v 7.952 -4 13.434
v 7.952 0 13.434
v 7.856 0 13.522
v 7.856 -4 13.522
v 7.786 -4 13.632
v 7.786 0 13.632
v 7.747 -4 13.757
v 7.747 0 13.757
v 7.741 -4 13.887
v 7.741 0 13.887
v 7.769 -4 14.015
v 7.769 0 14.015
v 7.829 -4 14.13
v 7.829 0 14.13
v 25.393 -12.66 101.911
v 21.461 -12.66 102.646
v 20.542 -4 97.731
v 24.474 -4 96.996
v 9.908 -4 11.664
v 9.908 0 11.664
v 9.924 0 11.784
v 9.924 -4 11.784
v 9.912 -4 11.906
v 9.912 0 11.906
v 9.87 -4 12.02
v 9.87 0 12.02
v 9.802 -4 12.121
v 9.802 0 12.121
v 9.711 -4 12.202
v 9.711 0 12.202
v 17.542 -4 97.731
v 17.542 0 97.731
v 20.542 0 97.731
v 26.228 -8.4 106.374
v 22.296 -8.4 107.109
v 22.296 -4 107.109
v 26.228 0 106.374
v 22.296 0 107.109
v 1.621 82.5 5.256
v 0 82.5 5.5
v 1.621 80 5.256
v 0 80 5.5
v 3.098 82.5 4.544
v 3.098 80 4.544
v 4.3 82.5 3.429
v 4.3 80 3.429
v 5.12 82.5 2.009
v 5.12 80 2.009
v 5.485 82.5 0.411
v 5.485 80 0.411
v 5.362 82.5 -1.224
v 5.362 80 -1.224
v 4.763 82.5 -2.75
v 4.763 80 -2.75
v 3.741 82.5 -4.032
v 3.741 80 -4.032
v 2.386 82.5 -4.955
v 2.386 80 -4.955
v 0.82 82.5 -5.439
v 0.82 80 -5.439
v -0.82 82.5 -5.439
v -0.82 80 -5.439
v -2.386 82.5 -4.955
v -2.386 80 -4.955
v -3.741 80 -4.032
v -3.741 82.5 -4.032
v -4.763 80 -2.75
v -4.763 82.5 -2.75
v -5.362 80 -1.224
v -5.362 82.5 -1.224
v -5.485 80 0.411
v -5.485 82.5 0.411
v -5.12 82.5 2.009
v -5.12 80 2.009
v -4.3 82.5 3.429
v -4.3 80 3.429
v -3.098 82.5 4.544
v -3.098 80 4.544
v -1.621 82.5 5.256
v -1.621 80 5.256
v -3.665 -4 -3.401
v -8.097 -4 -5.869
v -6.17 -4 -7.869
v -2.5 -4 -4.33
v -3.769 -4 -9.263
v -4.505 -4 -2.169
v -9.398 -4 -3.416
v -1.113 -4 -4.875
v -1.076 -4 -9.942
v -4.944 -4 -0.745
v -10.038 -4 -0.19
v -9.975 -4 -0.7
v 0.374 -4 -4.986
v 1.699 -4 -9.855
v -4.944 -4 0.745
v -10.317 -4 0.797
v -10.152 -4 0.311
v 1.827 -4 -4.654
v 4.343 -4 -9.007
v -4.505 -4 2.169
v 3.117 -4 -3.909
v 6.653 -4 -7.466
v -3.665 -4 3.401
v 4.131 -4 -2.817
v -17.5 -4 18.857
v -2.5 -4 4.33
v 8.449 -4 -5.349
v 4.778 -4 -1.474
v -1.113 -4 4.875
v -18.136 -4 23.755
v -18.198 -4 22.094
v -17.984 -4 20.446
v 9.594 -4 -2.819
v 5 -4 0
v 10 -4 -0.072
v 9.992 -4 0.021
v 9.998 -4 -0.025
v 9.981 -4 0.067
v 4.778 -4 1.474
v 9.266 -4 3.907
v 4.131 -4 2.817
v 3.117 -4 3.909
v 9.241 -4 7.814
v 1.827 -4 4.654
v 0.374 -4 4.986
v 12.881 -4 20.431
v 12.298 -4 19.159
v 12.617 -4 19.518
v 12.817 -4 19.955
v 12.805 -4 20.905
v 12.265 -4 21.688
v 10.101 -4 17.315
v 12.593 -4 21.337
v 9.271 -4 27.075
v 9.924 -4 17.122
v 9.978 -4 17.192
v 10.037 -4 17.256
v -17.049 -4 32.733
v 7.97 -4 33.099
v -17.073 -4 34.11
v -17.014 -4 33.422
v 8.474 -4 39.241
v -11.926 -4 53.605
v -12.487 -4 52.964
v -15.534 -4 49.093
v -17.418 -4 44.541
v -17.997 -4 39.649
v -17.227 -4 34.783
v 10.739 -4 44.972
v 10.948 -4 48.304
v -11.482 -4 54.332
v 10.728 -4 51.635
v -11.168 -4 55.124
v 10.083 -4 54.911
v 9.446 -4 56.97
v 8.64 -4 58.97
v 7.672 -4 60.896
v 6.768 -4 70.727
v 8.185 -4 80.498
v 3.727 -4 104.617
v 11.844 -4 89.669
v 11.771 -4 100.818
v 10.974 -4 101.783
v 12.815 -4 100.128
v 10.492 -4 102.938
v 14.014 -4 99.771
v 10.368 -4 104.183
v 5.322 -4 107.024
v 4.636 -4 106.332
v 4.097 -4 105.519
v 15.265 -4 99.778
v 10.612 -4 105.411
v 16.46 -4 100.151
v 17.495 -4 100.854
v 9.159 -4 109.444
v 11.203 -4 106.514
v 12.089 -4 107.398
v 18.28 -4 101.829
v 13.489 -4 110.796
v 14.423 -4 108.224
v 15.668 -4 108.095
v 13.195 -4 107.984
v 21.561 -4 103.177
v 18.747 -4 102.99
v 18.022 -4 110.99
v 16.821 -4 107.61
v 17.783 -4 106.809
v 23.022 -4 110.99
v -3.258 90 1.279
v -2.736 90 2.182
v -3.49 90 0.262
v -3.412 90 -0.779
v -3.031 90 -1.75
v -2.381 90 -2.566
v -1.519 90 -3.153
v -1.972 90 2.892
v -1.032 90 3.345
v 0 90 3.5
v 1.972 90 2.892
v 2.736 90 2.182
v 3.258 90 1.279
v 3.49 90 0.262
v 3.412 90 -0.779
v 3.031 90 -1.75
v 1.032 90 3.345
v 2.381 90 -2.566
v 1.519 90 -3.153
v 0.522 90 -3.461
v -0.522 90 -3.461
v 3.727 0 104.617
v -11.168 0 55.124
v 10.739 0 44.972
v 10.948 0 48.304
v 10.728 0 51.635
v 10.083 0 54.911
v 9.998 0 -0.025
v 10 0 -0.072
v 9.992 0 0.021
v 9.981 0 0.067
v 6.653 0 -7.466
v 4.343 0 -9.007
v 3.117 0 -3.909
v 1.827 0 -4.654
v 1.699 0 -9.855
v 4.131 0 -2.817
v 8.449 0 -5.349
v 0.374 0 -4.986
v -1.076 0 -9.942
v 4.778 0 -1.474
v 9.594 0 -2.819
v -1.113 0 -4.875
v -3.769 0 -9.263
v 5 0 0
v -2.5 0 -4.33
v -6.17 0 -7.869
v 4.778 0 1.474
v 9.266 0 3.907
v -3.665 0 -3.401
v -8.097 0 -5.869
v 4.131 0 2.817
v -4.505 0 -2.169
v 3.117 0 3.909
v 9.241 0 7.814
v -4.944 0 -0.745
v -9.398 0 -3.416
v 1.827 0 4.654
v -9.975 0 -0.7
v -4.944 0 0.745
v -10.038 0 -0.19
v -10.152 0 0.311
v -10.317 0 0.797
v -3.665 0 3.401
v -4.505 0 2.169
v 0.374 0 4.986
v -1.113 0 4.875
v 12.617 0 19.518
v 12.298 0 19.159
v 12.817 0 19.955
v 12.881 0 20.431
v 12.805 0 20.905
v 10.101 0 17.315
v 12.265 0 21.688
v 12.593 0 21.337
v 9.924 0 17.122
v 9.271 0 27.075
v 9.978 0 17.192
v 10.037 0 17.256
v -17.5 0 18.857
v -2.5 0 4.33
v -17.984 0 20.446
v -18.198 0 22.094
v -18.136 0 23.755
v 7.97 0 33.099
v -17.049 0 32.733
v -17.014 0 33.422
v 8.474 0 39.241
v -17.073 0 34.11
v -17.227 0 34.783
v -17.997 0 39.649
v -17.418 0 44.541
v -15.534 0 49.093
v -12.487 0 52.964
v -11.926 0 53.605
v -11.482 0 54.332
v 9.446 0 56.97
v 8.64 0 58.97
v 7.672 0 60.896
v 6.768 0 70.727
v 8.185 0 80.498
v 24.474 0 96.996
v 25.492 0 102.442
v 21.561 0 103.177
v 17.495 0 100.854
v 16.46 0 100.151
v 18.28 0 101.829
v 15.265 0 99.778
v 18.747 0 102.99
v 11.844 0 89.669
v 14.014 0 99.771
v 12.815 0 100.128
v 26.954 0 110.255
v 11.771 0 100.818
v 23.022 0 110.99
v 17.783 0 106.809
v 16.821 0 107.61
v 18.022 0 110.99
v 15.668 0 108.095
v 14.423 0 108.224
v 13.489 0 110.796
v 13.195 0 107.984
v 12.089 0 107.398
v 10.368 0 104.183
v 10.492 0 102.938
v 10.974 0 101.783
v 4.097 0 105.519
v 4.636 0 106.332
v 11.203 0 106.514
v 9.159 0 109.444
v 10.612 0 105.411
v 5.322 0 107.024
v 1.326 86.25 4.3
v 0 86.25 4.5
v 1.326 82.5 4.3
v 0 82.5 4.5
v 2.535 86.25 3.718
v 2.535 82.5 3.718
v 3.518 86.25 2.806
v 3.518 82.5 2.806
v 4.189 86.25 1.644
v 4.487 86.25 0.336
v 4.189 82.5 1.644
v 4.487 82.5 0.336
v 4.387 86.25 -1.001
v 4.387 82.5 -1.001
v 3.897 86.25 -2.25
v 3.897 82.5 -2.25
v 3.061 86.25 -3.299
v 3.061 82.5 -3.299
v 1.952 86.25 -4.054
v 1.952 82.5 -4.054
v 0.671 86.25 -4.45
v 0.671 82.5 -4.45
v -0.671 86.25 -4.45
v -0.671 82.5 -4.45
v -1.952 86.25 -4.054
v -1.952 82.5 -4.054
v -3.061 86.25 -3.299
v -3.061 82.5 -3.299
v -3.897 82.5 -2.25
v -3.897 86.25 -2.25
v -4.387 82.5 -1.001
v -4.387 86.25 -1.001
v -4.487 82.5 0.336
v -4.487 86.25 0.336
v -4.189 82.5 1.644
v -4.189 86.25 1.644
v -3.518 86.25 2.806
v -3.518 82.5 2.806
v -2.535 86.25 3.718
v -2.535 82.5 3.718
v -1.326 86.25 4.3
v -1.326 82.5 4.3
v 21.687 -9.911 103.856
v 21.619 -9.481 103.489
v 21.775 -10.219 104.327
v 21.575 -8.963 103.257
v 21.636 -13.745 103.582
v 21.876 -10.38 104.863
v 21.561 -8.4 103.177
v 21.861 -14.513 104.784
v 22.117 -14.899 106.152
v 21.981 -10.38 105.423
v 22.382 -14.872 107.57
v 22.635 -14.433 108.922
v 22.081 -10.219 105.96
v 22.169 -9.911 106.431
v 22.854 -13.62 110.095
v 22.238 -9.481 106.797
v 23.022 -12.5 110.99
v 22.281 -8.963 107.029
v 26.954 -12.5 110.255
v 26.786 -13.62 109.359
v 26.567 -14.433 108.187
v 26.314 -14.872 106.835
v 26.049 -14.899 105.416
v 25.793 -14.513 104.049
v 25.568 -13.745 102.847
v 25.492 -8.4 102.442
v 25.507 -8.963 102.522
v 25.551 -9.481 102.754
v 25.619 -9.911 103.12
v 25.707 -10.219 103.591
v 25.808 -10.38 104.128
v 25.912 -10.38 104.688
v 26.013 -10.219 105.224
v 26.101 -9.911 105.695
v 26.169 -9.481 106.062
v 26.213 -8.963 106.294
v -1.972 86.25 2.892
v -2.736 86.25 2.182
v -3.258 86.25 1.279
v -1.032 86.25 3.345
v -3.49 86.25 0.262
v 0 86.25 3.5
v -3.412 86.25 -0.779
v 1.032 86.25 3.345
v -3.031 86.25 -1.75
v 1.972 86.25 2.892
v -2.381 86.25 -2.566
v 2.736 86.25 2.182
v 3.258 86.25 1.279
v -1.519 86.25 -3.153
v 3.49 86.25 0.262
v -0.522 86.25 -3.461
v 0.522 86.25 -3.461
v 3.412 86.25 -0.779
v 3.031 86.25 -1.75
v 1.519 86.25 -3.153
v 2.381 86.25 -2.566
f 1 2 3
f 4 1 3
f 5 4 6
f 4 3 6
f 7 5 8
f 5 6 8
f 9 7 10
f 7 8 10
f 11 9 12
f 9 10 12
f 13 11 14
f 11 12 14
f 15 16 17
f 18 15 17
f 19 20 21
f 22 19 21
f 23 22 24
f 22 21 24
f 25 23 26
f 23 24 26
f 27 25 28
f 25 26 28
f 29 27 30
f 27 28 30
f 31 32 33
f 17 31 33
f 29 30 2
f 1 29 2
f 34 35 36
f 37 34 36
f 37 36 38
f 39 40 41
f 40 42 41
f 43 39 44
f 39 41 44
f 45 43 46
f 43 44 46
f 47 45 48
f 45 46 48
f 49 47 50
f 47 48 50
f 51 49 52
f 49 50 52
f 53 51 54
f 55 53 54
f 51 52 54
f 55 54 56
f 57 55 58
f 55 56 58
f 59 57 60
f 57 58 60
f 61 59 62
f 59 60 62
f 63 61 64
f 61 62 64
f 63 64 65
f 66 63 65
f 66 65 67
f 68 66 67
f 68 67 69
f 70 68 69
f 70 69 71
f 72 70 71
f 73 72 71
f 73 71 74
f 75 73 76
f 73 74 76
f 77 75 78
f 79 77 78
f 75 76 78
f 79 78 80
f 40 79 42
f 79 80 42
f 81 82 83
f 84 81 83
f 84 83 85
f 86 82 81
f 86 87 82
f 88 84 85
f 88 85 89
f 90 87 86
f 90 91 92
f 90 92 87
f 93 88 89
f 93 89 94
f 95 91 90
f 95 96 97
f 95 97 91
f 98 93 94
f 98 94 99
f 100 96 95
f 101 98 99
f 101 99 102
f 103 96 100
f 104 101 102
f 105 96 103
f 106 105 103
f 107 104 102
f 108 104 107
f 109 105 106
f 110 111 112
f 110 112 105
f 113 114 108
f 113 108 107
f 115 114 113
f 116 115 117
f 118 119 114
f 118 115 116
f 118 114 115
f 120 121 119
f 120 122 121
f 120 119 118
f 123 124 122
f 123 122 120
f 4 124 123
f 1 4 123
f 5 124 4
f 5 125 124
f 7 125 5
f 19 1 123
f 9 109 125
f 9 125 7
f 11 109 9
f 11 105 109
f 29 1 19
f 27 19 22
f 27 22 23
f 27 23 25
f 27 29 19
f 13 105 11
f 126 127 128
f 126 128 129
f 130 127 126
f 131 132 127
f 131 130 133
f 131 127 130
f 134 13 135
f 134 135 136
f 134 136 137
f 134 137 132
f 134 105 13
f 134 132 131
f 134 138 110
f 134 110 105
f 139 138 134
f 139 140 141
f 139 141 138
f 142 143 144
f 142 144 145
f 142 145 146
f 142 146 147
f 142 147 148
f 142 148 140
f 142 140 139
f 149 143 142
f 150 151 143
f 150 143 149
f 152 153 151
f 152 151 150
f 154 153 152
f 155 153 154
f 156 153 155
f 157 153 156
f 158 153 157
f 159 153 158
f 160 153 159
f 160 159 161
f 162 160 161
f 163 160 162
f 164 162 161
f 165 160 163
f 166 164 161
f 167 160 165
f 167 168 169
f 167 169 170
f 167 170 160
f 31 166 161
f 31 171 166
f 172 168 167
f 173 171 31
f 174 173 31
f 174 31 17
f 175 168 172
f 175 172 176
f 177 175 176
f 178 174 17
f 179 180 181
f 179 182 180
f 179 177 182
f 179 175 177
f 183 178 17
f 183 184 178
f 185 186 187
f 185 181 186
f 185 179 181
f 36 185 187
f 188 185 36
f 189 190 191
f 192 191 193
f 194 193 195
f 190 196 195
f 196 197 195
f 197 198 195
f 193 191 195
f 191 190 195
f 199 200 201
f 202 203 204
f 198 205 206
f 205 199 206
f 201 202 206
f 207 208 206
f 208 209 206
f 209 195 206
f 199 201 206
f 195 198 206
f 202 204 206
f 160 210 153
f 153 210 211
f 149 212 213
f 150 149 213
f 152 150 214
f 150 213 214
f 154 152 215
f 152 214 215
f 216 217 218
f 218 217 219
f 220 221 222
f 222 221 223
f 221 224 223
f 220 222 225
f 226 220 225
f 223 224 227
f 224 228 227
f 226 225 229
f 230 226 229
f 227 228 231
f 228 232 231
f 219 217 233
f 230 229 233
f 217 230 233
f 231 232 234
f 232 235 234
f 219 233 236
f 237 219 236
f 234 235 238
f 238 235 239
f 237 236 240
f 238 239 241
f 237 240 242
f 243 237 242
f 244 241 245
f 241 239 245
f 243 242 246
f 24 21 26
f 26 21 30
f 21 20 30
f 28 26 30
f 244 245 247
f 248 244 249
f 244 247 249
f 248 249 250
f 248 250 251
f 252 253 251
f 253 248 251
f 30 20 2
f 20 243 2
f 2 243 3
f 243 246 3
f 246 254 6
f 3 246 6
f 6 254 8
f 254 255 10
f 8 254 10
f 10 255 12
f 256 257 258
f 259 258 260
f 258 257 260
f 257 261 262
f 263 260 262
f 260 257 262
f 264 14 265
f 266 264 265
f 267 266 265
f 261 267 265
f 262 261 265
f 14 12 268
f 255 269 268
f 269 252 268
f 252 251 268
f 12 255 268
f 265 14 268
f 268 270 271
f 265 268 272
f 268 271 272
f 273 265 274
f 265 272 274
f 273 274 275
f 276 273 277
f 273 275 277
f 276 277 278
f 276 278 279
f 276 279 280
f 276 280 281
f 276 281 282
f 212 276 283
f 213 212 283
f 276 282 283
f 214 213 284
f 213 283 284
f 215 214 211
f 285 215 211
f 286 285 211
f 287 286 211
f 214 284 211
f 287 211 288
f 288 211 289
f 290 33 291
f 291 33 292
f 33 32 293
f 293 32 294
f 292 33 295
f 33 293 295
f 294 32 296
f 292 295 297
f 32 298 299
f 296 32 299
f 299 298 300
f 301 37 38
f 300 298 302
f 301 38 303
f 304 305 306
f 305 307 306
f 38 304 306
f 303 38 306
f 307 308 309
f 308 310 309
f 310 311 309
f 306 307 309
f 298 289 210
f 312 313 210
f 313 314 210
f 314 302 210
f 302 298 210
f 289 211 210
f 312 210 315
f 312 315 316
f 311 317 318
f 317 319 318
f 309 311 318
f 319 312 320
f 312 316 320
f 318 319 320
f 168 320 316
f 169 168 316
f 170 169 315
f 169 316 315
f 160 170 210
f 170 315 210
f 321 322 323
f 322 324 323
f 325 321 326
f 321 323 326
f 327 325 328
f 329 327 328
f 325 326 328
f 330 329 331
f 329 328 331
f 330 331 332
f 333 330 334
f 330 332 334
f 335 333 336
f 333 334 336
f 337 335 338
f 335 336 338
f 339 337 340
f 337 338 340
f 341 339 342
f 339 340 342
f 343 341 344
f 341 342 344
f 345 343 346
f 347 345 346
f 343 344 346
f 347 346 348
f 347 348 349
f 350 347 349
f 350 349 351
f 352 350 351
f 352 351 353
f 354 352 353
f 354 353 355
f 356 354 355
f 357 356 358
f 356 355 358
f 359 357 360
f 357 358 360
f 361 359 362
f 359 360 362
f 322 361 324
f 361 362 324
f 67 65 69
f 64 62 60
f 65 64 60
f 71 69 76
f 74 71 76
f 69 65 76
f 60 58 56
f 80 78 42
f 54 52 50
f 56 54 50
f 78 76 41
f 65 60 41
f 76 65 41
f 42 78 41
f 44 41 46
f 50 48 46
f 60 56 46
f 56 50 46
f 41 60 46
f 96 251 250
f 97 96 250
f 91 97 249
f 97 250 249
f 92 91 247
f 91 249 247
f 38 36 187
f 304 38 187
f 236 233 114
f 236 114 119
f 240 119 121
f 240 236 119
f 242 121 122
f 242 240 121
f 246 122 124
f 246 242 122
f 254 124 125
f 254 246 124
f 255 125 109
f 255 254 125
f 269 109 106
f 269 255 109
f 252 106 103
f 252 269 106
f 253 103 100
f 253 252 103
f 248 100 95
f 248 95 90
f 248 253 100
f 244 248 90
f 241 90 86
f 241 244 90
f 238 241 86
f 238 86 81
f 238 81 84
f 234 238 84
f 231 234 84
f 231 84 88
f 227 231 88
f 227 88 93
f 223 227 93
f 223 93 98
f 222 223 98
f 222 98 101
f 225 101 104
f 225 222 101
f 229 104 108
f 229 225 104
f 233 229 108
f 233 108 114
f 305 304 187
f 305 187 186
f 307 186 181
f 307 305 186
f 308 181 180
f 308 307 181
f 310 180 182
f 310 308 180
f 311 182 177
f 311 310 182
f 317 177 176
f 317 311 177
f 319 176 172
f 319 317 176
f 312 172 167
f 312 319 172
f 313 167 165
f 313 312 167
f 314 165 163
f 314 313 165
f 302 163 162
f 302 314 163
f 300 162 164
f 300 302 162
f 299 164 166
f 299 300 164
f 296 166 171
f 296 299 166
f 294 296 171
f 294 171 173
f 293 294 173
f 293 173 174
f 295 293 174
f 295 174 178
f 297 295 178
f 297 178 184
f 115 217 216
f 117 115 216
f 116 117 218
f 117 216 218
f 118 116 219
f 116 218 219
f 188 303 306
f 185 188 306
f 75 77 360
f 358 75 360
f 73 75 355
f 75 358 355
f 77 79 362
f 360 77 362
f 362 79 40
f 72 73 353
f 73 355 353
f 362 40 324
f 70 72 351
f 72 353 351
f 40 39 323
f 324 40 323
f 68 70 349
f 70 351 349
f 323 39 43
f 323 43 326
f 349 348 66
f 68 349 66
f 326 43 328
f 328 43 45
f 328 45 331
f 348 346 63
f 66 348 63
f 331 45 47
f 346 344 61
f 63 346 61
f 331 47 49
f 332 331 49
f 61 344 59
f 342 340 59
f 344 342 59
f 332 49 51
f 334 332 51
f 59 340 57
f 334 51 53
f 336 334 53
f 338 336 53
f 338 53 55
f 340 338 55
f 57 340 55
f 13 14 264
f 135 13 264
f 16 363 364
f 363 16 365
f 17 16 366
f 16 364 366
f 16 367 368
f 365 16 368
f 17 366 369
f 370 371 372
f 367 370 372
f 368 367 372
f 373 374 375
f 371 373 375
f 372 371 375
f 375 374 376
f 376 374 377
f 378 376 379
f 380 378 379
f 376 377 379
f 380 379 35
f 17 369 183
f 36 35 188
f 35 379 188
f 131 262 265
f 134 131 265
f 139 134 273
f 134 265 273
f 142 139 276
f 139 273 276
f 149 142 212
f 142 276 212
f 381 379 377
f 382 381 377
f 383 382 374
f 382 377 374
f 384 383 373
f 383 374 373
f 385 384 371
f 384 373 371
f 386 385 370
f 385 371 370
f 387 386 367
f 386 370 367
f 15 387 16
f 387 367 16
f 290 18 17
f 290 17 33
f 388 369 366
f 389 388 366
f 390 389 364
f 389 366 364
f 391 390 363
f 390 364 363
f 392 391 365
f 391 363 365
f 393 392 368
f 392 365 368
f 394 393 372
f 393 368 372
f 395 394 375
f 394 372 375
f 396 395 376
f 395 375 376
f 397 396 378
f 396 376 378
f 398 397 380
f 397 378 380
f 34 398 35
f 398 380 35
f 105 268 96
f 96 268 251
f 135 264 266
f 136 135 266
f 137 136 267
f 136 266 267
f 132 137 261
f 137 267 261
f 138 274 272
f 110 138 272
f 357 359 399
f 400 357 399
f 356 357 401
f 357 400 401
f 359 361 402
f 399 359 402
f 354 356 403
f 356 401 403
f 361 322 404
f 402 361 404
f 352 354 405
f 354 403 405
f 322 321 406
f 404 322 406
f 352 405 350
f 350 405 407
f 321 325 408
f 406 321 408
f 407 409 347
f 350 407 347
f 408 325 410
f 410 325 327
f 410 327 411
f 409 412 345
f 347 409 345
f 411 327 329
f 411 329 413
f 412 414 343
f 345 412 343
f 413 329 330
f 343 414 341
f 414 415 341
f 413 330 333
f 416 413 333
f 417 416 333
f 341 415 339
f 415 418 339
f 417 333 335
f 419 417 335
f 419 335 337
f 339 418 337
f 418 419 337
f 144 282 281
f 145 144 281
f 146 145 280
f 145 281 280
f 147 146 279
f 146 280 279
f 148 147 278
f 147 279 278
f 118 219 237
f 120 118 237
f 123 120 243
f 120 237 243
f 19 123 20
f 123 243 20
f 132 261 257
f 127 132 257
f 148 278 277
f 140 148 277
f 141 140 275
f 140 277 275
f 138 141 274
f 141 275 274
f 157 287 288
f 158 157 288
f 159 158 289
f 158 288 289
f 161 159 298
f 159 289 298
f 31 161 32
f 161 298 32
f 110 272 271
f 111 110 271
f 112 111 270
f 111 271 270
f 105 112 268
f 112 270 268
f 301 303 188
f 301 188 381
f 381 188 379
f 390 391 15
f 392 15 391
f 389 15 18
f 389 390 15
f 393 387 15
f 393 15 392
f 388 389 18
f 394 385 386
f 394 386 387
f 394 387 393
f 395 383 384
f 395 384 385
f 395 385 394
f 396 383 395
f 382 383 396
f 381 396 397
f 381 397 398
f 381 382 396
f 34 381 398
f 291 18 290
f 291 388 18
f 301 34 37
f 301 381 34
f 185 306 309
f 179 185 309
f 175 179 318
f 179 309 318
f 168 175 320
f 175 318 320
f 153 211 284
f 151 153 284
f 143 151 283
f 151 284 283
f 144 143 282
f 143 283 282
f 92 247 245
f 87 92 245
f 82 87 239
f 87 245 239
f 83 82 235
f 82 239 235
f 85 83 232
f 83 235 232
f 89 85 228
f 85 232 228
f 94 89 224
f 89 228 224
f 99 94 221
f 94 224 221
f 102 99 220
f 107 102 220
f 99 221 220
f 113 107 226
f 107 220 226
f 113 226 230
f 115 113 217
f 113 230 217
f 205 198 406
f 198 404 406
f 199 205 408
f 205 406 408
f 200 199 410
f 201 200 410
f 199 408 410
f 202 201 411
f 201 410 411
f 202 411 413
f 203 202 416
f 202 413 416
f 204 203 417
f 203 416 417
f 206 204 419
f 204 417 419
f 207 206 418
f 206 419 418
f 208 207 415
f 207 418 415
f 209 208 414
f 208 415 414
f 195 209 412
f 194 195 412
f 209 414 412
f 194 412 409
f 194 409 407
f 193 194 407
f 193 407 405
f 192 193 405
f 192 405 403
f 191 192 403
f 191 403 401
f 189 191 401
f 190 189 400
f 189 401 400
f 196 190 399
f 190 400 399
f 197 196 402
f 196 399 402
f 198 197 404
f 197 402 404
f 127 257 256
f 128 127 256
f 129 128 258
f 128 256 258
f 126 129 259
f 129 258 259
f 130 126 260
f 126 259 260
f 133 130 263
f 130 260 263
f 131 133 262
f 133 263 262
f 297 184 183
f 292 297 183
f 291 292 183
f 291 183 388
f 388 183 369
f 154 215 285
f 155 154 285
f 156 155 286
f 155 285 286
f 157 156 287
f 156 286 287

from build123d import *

# Parameters (mm, degrees)
F0_R     = 5
F0_R_2   = 4.25
F1_DEPTH = 4
F3_DEPTH = 4
F5_DEPTH = 25


with BuildPart() as f1:
    # F0 (on Front) → F1 (new body)
    with BuildSketch(Plane.XZ):
        with BuildLine():
            ThreePointArc((12.2650222898, 21.6880099312), (7.9704050479, 33.0985342265), (10.7389089564, 44.9719999404))
            ThreePointArc((10.7389089564, 44.9719999404), (10.8914434684, 49.9730301536), (10.0832368005, 54.9106785769))
            ThreePointArc((10.0832368005, 54.9106785769), (9.0639005375, 57.9782526004), (7.671797859, 60.8956327502))
            ThreePointArc((7.671797859, 60.8956327502), (8.1851123857, 80.4983236589), (17.5419144198, 97.7314092316))
            Line((17.5419144198, 97.7314092316), (20.5419144198, 97.7314092316))
            Line((20.5419144198, 97.7314092316), (23.0218023764, 110.9901437528))
            Line((23.0218023764, 110.9901437528), (18.0218023764, 110.9901437528))
            ThreePointArc((18.0218023764, 110.9901437528), (11.2803266129, 110.2612488956), (5.3219915514, 107.0244253791))
            ThreePointArc((5.3219915514, 107.0244253791), (4.3468843881, 105.9385897965), (3.7268564987, 104.6174394233))
            Line((3.7268564987, 104.6174394233), (-11.1683143292, 55.1241001526))
            ThreePointArc((-11.1683143292, 55.1241001526), (-11.6889308588, 53.9591634235), (-12.4874515148, 52.9639328394))
            ThreePointArc((-12.4874515148, 52.9639328394), (-17.4178097195, 44.5409145086), (-17.2273496163, 34.7828719397))
            ThreePointArc((-17.2273496163, 34.7828719397), (-17.0315424316, 33.7670576387), (-17.0489735044, 32.732690535))
            Line((-17.0489735044, 32.732690535), (-18.1359854504, 23.7545812302))
            ThreePointArc((-18.1359854504, 23.7545812302), (-18.1253384879, 21.2657717208), (-17.5004131485, 18.8566734554))
            Line((-17.5004131485, 18.8566734554), (-10.3172053735, 0.7974811558))
            ThreePointArc((-10.3172053735, 0.7974811558), (-10.0884552373, 0.0617805734), (-9.9754468186, -0.700329044))
            ThreePointArc((-9.9754468186, -0.700329044), (0.3144905166, -9.9950535624), (9.9997421097, -0.071817406))
            ThreePointArc((9.9997421097, -0.071817406), (9.9953426305, -0.0019475446), (9.9812273483, 0.0666229429))
            ThreePointArc((9.9812273483, 0.0666229429), (9.1664539194, 5.860319077), (9.9075932487, 11.6638941071))
            ThreePointArc((9.9075932487, 11.6638941071), (9.8941724043, 11.9639619698), (9.7112356205, 12.2021949953))
            Line((9.7112356205, 12.2021949953), (7.9521198893, 13.4339410909))
            ThreePointArc((7.9521198893, 13.4339410909), (7.7465042309, 13.7566930242), (7.8293320853, 14.1303053312))
            Line((7.8293320853, 14.1303053312), (9.9244872296, 17.1224969743))
            ThreePointArc((9.9244872296, 17.1224969743), (10.0063619371, 17.2245107456), (10.1008516642, 17.3149649811))
            Line((10.1008516642, 17.3149649811), (12.2981333294, 19.1587032159))
            ThreePointArc((12.2981333294, 19.1587032159), (12.8814034736, 20.4312088641), (12.2650222898, 21.6880099312))
        make_face()
        Circle(F0_R, mode=Mode.SUBTRACT)
        with Locations((14.6131756008, 103.9781472179)):
            Circle(F0_R_2, mode=Mode.SUBTRACT)
    extrude(amount=F1_DEPTH)

    # F2 (on face) → F3 (join)
    with BuildSketch(Plane(origin=(2.1859498324, 0, -0.4088558116), x_dir=(0, 1, 0), z_dir=(0.9829543353, 0, -0.18384987))):
        with BuildLine():
            Line((-12.6602540378, 104.8421406956), (-4, 99.8421406956))
            Line((-4, 99.8421406956), (0, 99.8421406956))
            Line((0, 99.8421406956), (0, 105.3824818801))
            Line((0, 105.3824818801), (-8.4, 105.3824818801))
            ThreePointArc((-8.4, 105.3824818801), (-10.4, 107.3824818801), (-8.4, 109.3824818801))
            Line((-8.4, 109.3824818801), (0, 109.3824818801))
            Line((0, 109.3824818801), (0, 113.3307983523))
            Line((0, 113.3307983523), (-4, 113.3307983523))
            Line((-4, 113.3307983523), (-12.5, 113.3307983523))
            ThreePointArc((-12.5, 113.3307983523), (-14.9378794182, 109.1309806066), (-12.6602540378, 104.8421406956))
        make_face()
    extrude(amount=F3_DEPTH)

    # F4 (on face) → F5 (cut)
    with BuildSketch(Plane.XZ.offset(4)):
        with BuildLine():
            ThreePointArc((18.7467740956, 102.9902891897), (18.8339749092, 103.4808010622), (18.8631756008, 103.9781472179))
            ThreePointArc((18.8631756008, 103.9781472179), (18.5839615318, 105.4931914715), (17.783006617, 106.8091667036))
            ThreePointArc((17.783006617, 106.8091667036), (10.4923774958, 102.9381842484), (18.7467740956, 102.9902891897))
        make_face()
        with BuildLine():
            ThreePointArc((17.783006617, 106.8091667036), (18.5839615318, 105.4931914715), (18.8631756008, 103.9781472179))
            ThreePointArc((18.8631756008, 103.9781472179), (18.8339749092, 103.4808010622), (18.7467740956, 102.9902891897))
            Line((18.7467740956, 102.9902891897), (21.5605054263, 103.177311618))
            Line((21.5605054263, 103.177311618), (22.2959049063, 107.1091289592))
            Line((22.2959049063, 107.1091289592), (17.783006617, 106.8091667036))
        make_face()
    extrude(amount=-F5_DEPTH, mode=Mode.SUBTRACT)


with BuildPart() as f7:
    # F6 (on Right) → F7 (revolve)
    with BuildSketch(Plane.YZ):
        Polygon((80, 5.5), (80, 0), (90, 0), (90, 3.5), (86.25, 3.5), (86.25, 4.5), (82.5, 4.5), (82.5, 5.5), align=None)
    revolve(axis=Axis((0, 85, 0), (0, 1, 0)))


solid = Compound([f1.part, f7.part])
